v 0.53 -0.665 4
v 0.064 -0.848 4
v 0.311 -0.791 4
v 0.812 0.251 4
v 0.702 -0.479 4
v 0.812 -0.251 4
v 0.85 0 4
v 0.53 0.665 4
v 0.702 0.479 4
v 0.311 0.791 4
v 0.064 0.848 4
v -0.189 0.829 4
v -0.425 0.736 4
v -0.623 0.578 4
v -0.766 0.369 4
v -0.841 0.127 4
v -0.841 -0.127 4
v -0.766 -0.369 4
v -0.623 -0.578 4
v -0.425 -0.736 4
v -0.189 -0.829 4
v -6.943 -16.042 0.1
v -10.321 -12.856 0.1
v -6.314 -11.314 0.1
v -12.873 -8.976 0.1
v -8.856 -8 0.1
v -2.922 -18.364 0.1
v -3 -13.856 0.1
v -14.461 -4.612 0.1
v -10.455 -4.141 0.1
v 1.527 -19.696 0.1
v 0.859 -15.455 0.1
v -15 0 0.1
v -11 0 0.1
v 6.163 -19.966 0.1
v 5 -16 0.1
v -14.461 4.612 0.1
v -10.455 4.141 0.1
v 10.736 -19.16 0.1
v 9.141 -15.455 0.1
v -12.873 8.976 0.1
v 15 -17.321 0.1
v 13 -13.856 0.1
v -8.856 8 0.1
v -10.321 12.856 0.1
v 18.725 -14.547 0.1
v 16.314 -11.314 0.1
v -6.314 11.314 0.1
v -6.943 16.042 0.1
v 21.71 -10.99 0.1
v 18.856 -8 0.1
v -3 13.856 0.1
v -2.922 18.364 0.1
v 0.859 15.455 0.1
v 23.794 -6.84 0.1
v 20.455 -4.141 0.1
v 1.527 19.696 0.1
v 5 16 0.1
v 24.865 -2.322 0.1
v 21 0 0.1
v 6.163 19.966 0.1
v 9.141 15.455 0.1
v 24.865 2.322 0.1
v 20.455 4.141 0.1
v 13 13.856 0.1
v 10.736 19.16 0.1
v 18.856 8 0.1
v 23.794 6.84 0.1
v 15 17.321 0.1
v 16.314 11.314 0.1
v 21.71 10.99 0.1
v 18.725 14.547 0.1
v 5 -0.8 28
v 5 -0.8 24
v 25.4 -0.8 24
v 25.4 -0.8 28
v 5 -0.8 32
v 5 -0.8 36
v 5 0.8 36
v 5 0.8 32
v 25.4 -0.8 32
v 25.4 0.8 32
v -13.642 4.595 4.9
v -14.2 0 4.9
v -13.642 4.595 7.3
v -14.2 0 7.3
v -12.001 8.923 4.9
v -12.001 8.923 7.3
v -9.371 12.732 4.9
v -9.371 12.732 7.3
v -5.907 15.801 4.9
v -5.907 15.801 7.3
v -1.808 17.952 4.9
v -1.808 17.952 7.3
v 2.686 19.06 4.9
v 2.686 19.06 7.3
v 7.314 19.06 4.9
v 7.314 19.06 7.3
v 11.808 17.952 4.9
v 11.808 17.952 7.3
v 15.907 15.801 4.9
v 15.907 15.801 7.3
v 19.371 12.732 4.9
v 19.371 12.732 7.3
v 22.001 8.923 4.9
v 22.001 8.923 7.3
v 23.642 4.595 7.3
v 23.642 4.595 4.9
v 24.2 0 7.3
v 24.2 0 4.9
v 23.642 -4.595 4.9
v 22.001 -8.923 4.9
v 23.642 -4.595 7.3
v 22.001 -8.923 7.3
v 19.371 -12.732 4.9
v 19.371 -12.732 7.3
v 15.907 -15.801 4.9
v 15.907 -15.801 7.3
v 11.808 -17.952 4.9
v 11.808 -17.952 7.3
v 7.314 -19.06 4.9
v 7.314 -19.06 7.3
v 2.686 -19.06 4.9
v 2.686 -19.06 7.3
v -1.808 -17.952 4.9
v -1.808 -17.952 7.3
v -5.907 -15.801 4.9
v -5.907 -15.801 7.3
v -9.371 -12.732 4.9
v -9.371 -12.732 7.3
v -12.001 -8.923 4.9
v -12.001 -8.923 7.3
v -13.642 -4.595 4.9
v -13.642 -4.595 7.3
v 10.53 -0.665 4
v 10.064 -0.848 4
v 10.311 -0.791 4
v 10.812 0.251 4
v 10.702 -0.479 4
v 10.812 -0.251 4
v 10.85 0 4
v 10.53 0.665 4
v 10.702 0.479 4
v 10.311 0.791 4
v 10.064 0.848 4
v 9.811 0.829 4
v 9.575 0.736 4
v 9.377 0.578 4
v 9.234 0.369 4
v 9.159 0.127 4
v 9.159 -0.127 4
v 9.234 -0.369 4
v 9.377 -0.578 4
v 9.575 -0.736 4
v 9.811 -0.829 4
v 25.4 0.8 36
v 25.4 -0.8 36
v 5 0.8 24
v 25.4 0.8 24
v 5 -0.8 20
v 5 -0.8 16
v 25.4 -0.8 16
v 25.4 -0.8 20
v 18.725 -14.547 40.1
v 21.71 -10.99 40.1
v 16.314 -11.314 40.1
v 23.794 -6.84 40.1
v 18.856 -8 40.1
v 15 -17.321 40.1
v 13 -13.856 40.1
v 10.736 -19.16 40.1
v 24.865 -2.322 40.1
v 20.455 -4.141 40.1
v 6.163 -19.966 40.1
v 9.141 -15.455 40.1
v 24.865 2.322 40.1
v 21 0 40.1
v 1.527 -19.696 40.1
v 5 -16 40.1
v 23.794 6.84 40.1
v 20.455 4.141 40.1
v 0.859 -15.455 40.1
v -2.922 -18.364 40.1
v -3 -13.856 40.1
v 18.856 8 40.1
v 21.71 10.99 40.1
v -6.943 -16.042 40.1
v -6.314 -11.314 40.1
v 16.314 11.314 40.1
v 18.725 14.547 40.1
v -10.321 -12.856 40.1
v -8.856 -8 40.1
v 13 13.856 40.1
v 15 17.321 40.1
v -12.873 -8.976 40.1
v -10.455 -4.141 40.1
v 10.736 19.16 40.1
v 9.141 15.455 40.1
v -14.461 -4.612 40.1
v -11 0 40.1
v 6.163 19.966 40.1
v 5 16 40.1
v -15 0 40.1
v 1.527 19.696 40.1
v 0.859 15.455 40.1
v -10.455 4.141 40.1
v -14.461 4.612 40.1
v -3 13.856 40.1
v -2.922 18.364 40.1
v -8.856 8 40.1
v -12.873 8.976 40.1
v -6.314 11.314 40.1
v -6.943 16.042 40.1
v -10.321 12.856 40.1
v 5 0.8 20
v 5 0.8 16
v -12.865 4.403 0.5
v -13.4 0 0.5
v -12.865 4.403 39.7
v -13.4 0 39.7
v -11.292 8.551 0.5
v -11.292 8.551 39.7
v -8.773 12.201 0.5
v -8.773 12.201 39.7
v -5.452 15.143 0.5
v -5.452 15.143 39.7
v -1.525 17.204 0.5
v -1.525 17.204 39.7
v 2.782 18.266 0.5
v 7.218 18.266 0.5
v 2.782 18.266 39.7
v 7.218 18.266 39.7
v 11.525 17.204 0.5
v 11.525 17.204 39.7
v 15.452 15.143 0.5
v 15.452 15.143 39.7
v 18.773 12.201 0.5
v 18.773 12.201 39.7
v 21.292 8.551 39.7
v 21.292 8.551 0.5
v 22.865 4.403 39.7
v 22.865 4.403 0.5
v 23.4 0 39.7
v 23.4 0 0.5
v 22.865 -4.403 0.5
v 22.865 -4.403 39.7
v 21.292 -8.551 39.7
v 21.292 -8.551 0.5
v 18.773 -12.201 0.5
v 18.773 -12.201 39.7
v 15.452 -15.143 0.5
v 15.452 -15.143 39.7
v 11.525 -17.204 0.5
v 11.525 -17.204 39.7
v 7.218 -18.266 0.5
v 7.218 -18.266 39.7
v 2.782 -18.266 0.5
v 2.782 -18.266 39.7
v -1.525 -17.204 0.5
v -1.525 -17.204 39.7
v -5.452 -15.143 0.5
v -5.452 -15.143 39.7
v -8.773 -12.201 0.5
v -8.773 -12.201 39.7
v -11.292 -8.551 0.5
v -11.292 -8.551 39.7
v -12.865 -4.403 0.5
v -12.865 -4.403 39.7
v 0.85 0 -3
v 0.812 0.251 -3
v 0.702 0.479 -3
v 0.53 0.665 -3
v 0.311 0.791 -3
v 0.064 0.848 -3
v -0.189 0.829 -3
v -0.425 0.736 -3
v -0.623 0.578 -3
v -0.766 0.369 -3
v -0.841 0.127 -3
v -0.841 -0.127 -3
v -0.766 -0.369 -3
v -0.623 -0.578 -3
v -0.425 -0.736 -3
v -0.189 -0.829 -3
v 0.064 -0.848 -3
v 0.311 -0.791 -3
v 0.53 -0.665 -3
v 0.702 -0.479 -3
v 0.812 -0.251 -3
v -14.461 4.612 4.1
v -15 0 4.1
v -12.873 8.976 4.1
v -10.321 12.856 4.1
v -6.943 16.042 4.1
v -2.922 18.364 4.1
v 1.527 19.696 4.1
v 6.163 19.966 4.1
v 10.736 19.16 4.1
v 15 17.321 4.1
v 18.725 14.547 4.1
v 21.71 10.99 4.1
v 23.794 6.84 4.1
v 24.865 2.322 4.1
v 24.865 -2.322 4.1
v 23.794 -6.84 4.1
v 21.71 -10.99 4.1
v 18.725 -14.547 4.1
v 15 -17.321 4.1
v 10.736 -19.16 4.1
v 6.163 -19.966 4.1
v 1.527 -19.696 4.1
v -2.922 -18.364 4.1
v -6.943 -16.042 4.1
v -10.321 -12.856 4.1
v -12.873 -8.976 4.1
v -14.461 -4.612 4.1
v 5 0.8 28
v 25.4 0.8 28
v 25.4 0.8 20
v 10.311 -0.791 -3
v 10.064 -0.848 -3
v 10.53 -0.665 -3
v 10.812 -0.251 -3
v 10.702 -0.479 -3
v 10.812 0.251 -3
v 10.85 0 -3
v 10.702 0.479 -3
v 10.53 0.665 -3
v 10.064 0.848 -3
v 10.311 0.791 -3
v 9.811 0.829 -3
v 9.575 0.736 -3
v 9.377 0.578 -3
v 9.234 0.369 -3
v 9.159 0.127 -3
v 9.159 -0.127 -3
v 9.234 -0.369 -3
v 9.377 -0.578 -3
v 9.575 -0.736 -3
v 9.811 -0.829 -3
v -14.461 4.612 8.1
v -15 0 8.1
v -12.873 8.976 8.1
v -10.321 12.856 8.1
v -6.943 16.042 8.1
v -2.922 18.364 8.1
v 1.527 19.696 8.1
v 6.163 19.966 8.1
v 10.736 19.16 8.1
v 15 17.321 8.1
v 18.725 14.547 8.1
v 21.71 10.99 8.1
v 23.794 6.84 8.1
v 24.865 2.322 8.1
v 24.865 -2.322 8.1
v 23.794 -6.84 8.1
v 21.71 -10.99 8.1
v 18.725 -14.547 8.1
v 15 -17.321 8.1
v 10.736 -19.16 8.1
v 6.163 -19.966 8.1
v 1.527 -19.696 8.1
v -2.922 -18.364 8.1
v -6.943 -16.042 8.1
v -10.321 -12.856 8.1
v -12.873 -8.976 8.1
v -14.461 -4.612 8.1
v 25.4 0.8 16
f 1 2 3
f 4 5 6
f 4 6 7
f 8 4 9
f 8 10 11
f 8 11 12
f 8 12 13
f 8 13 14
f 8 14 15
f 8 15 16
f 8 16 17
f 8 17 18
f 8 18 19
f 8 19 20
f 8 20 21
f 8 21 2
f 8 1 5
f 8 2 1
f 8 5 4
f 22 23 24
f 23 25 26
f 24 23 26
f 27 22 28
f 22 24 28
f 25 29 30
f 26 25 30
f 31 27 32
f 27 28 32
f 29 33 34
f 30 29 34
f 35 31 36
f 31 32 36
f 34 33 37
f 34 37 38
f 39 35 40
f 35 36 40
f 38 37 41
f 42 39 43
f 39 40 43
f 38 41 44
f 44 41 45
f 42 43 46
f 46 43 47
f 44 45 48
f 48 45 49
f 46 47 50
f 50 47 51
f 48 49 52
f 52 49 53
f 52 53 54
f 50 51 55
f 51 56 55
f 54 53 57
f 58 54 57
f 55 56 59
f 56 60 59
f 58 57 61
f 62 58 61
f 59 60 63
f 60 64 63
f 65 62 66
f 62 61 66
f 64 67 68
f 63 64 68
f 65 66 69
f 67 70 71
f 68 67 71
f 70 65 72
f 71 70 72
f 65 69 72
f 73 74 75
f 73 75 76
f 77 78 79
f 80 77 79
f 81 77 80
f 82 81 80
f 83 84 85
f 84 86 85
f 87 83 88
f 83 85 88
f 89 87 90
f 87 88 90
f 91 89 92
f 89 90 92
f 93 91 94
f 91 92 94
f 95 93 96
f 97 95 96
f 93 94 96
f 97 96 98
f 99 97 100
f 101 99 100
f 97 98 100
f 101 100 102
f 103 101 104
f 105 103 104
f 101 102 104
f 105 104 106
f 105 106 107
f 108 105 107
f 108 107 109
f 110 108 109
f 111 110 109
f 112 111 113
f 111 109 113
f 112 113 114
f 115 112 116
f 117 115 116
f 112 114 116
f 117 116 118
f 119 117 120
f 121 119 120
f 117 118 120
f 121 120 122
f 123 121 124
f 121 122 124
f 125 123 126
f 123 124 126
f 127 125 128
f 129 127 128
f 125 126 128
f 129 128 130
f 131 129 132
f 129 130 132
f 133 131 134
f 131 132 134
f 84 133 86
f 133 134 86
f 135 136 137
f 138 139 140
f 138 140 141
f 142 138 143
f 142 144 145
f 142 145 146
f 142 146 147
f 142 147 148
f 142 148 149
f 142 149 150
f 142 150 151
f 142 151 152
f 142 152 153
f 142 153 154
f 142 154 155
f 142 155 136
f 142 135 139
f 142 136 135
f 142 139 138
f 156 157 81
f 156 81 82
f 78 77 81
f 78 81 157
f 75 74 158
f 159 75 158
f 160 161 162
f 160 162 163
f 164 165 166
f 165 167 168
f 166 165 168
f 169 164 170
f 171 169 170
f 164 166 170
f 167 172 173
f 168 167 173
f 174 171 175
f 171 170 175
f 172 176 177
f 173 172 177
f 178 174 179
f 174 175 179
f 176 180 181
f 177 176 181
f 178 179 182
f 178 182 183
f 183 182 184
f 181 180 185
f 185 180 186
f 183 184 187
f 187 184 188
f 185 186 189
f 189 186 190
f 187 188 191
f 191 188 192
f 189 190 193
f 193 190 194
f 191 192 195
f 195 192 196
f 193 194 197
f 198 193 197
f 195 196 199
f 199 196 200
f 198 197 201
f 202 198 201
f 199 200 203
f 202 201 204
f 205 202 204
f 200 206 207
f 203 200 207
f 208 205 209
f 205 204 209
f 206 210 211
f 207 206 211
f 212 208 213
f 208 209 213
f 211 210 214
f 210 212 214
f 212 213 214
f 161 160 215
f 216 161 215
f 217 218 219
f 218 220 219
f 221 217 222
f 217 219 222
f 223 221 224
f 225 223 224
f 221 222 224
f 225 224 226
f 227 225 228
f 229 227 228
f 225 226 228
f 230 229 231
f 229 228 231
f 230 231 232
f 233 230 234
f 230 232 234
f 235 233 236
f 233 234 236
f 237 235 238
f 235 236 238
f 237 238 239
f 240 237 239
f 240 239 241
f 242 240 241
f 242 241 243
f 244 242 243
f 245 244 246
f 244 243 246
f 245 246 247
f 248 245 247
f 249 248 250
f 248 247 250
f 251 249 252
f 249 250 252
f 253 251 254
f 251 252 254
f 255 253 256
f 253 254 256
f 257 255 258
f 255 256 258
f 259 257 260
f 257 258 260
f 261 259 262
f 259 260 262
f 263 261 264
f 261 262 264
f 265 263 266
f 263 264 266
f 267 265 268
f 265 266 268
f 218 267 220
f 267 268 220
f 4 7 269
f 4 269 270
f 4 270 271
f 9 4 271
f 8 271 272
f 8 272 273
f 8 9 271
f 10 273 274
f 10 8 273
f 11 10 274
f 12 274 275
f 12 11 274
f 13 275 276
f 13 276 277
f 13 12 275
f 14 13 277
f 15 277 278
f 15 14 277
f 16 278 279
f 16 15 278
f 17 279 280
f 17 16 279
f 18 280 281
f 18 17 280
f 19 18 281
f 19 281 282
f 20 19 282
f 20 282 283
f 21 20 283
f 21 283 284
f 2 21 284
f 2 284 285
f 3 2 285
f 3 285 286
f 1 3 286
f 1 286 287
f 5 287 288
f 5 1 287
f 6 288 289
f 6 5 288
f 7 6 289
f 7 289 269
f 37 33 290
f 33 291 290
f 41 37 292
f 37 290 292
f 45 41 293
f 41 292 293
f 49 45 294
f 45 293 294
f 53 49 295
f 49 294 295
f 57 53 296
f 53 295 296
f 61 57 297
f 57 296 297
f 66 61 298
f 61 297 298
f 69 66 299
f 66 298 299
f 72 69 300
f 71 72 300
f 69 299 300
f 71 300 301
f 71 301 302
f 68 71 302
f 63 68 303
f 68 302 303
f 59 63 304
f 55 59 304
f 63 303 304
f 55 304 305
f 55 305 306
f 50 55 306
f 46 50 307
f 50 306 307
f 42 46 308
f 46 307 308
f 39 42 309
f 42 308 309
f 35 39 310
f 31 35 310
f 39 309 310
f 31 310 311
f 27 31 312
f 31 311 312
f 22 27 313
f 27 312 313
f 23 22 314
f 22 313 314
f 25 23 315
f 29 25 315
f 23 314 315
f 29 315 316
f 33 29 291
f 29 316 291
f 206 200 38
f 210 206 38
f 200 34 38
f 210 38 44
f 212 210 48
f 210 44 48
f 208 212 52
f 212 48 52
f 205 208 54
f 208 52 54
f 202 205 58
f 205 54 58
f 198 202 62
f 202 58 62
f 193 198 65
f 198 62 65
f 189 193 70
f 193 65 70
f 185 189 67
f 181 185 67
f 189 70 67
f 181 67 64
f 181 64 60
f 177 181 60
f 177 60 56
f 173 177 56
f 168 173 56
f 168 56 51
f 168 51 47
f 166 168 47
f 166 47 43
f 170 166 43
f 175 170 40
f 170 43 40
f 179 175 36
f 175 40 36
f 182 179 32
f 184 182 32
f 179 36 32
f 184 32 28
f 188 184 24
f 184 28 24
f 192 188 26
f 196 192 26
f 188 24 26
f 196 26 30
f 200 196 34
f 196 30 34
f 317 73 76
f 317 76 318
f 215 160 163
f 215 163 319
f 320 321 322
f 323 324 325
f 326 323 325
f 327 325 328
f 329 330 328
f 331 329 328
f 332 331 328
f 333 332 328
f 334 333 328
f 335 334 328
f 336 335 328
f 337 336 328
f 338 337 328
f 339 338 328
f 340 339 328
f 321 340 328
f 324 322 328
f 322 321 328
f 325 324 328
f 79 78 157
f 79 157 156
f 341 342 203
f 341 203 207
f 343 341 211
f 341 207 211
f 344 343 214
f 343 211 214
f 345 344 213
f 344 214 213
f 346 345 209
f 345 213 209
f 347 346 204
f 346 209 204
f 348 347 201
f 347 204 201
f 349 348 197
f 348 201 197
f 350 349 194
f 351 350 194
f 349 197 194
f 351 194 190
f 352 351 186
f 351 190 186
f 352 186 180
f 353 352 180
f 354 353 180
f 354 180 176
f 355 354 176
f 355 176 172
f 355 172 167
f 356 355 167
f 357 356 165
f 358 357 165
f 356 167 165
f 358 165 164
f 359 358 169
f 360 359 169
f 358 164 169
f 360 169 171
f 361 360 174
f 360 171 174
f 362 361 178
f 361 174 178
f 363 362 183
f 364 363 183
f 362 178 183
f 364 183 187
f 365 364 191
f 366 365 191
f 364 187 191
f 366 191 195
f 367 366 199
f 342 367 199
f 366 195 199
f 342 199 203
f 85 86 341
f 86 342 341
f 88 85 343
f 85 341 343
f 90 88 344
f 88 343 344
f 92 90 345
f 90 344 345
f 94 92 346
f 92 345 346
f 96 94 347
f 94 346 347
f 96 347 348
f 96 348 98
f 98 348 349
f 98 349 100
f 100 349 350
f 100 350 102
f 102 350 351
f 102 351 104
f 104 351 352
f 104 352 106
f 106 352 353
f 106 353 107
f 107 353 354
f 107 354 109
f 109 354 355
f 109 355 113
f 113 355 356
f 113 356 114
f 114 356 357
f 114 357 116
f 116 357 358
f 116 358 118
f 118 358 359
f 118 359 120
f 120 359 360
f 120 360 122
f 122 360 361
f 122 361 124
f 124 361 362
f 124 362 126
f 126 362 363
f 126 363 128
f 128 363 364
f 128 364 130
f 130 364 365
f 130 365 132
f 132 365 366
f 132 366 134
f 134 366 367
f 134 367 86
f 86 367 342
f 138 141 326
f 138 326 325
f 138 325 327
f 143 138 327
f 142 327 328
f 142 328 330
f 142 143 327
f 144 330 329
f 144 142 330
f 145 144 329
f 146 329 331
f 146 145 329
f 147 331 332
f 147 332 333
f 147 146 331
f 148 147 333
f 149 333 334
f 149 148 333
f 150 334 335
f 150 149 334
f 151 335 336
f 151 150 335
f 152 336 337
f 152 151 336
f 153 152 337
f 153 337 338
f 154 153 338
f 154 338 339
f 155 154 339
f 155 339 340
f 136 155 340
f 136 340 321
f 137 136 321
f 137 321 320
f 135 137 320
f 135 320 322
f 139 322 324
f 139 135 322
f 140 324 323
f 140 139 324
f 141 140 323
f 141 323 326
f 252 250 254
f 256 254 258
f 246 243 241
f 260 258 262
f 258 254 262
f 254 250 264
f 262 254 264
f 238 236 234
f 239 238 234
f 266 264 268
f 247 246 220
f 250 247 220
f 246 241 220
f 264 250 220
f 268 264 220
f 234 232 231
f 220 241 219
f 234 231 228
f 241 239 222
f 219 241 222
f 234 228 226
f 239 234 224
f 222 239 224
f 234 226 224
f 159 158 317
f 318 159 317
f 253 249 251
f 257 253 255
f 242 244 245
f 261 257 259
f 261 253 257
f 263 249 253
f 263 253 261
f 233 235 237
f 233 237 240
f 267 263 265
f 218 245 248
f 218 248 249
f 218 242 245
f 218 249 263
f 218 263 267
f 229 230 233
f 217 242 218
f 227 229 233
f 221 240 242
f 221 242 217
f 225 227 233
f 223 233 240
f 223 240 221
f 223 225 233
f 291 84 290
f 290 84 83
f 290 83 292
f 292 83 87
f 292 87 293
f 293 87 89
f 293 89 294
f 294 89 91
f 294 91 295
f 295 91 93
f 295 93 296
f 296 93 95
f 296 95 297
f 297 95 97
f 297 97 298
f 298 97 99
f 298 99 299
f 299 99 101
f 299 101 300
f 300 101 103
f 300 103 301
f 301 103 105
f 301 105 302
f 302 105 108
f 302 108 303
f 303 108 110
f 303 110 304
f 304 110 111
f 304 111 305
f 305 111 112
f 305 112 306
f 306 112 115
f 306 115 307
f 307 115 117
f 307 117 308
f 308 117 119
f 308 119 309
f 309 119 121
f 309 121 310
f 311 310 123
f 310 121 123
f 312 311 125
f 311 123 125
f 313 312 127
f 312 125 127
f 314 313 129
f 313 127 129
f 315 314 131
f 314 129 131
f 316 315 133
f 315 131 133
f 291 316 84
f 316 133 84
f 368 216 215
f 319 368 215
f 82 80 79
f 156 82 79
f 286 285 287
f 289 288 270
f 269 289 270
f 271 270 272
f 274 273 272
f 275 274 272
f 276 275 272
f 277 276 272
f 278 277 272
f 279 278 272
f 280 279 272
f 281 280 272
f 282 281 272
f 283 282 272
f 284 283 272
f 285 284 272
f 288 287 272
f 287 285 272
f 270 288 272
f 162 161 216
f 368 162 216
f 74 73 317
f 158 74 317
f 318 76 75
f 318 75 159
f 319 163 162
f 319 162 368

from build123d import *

# Parameters (mm, degrees)
SKETCH002_W  = 18.4
SKETCH002_H  = 39.2
SKETCH003_R  = 0.85
PAD_DEPTH    = 7
SKETCH004_W  = 1.6
SKETCH004_H  = 4
PAD001_DEPTH = 20.4


with BuildPart() as revolution:
    # Sketch → Revolution (revolve)
    with BuildSketch(Plane.XZ):
        Polygon((-15, 0.1), (-15, 4.1), (-14.2, 4.9), (-14.2, 7.3), (-15, 8.1), (-15, 40.1), (-11, 40.1), (-11, 0.1), align=None)
    revolve(axis=Axis((5, 0, 7.548619), (0, 0, -1)))


with BuildPart() as revolution001:
    # Sketch002 → Revolution001 (revolve)
    with BuildSketch(Plane.XZ):
        with Locations((-4.2, 20.1)):
            Rectangle(SKETCH002_W, SKETCH002_H)
    revolve(axis=Axis((5, 0, 4.680116), (0, 0, -1)))


with BuildPart() as pad:
    # Sketch003 → Pad (new body)
    with BuildSketch(Plane.XY.offset(4)):
        Circle(SKETCH003_R)
        with Locations((10, 0)):
            Circle(SKETCH003_R)
    extrude(amount=-PAD_DEPTH)


with BuildPart() as pad001:
    # Sketch004 → Pad001 (new body)
    with BuildSketch(Plane.YZ.offset(5)):
        with Locations((0, 18)):
            Rectangle(SKETCH004_W, SKETCH004_H)
        with Locations((0, 26)):
            Rectangle(SKETCH004_W, SKETCH004_H)
        with Locations((0, 34)):
            Rectangle(SKETCH004_W, SKETCH004_H)
    extrude(amount=PAD001_DEPTH)


solid = Compound([revolution.part, revolution001.part, pad.part, pad001.part])
